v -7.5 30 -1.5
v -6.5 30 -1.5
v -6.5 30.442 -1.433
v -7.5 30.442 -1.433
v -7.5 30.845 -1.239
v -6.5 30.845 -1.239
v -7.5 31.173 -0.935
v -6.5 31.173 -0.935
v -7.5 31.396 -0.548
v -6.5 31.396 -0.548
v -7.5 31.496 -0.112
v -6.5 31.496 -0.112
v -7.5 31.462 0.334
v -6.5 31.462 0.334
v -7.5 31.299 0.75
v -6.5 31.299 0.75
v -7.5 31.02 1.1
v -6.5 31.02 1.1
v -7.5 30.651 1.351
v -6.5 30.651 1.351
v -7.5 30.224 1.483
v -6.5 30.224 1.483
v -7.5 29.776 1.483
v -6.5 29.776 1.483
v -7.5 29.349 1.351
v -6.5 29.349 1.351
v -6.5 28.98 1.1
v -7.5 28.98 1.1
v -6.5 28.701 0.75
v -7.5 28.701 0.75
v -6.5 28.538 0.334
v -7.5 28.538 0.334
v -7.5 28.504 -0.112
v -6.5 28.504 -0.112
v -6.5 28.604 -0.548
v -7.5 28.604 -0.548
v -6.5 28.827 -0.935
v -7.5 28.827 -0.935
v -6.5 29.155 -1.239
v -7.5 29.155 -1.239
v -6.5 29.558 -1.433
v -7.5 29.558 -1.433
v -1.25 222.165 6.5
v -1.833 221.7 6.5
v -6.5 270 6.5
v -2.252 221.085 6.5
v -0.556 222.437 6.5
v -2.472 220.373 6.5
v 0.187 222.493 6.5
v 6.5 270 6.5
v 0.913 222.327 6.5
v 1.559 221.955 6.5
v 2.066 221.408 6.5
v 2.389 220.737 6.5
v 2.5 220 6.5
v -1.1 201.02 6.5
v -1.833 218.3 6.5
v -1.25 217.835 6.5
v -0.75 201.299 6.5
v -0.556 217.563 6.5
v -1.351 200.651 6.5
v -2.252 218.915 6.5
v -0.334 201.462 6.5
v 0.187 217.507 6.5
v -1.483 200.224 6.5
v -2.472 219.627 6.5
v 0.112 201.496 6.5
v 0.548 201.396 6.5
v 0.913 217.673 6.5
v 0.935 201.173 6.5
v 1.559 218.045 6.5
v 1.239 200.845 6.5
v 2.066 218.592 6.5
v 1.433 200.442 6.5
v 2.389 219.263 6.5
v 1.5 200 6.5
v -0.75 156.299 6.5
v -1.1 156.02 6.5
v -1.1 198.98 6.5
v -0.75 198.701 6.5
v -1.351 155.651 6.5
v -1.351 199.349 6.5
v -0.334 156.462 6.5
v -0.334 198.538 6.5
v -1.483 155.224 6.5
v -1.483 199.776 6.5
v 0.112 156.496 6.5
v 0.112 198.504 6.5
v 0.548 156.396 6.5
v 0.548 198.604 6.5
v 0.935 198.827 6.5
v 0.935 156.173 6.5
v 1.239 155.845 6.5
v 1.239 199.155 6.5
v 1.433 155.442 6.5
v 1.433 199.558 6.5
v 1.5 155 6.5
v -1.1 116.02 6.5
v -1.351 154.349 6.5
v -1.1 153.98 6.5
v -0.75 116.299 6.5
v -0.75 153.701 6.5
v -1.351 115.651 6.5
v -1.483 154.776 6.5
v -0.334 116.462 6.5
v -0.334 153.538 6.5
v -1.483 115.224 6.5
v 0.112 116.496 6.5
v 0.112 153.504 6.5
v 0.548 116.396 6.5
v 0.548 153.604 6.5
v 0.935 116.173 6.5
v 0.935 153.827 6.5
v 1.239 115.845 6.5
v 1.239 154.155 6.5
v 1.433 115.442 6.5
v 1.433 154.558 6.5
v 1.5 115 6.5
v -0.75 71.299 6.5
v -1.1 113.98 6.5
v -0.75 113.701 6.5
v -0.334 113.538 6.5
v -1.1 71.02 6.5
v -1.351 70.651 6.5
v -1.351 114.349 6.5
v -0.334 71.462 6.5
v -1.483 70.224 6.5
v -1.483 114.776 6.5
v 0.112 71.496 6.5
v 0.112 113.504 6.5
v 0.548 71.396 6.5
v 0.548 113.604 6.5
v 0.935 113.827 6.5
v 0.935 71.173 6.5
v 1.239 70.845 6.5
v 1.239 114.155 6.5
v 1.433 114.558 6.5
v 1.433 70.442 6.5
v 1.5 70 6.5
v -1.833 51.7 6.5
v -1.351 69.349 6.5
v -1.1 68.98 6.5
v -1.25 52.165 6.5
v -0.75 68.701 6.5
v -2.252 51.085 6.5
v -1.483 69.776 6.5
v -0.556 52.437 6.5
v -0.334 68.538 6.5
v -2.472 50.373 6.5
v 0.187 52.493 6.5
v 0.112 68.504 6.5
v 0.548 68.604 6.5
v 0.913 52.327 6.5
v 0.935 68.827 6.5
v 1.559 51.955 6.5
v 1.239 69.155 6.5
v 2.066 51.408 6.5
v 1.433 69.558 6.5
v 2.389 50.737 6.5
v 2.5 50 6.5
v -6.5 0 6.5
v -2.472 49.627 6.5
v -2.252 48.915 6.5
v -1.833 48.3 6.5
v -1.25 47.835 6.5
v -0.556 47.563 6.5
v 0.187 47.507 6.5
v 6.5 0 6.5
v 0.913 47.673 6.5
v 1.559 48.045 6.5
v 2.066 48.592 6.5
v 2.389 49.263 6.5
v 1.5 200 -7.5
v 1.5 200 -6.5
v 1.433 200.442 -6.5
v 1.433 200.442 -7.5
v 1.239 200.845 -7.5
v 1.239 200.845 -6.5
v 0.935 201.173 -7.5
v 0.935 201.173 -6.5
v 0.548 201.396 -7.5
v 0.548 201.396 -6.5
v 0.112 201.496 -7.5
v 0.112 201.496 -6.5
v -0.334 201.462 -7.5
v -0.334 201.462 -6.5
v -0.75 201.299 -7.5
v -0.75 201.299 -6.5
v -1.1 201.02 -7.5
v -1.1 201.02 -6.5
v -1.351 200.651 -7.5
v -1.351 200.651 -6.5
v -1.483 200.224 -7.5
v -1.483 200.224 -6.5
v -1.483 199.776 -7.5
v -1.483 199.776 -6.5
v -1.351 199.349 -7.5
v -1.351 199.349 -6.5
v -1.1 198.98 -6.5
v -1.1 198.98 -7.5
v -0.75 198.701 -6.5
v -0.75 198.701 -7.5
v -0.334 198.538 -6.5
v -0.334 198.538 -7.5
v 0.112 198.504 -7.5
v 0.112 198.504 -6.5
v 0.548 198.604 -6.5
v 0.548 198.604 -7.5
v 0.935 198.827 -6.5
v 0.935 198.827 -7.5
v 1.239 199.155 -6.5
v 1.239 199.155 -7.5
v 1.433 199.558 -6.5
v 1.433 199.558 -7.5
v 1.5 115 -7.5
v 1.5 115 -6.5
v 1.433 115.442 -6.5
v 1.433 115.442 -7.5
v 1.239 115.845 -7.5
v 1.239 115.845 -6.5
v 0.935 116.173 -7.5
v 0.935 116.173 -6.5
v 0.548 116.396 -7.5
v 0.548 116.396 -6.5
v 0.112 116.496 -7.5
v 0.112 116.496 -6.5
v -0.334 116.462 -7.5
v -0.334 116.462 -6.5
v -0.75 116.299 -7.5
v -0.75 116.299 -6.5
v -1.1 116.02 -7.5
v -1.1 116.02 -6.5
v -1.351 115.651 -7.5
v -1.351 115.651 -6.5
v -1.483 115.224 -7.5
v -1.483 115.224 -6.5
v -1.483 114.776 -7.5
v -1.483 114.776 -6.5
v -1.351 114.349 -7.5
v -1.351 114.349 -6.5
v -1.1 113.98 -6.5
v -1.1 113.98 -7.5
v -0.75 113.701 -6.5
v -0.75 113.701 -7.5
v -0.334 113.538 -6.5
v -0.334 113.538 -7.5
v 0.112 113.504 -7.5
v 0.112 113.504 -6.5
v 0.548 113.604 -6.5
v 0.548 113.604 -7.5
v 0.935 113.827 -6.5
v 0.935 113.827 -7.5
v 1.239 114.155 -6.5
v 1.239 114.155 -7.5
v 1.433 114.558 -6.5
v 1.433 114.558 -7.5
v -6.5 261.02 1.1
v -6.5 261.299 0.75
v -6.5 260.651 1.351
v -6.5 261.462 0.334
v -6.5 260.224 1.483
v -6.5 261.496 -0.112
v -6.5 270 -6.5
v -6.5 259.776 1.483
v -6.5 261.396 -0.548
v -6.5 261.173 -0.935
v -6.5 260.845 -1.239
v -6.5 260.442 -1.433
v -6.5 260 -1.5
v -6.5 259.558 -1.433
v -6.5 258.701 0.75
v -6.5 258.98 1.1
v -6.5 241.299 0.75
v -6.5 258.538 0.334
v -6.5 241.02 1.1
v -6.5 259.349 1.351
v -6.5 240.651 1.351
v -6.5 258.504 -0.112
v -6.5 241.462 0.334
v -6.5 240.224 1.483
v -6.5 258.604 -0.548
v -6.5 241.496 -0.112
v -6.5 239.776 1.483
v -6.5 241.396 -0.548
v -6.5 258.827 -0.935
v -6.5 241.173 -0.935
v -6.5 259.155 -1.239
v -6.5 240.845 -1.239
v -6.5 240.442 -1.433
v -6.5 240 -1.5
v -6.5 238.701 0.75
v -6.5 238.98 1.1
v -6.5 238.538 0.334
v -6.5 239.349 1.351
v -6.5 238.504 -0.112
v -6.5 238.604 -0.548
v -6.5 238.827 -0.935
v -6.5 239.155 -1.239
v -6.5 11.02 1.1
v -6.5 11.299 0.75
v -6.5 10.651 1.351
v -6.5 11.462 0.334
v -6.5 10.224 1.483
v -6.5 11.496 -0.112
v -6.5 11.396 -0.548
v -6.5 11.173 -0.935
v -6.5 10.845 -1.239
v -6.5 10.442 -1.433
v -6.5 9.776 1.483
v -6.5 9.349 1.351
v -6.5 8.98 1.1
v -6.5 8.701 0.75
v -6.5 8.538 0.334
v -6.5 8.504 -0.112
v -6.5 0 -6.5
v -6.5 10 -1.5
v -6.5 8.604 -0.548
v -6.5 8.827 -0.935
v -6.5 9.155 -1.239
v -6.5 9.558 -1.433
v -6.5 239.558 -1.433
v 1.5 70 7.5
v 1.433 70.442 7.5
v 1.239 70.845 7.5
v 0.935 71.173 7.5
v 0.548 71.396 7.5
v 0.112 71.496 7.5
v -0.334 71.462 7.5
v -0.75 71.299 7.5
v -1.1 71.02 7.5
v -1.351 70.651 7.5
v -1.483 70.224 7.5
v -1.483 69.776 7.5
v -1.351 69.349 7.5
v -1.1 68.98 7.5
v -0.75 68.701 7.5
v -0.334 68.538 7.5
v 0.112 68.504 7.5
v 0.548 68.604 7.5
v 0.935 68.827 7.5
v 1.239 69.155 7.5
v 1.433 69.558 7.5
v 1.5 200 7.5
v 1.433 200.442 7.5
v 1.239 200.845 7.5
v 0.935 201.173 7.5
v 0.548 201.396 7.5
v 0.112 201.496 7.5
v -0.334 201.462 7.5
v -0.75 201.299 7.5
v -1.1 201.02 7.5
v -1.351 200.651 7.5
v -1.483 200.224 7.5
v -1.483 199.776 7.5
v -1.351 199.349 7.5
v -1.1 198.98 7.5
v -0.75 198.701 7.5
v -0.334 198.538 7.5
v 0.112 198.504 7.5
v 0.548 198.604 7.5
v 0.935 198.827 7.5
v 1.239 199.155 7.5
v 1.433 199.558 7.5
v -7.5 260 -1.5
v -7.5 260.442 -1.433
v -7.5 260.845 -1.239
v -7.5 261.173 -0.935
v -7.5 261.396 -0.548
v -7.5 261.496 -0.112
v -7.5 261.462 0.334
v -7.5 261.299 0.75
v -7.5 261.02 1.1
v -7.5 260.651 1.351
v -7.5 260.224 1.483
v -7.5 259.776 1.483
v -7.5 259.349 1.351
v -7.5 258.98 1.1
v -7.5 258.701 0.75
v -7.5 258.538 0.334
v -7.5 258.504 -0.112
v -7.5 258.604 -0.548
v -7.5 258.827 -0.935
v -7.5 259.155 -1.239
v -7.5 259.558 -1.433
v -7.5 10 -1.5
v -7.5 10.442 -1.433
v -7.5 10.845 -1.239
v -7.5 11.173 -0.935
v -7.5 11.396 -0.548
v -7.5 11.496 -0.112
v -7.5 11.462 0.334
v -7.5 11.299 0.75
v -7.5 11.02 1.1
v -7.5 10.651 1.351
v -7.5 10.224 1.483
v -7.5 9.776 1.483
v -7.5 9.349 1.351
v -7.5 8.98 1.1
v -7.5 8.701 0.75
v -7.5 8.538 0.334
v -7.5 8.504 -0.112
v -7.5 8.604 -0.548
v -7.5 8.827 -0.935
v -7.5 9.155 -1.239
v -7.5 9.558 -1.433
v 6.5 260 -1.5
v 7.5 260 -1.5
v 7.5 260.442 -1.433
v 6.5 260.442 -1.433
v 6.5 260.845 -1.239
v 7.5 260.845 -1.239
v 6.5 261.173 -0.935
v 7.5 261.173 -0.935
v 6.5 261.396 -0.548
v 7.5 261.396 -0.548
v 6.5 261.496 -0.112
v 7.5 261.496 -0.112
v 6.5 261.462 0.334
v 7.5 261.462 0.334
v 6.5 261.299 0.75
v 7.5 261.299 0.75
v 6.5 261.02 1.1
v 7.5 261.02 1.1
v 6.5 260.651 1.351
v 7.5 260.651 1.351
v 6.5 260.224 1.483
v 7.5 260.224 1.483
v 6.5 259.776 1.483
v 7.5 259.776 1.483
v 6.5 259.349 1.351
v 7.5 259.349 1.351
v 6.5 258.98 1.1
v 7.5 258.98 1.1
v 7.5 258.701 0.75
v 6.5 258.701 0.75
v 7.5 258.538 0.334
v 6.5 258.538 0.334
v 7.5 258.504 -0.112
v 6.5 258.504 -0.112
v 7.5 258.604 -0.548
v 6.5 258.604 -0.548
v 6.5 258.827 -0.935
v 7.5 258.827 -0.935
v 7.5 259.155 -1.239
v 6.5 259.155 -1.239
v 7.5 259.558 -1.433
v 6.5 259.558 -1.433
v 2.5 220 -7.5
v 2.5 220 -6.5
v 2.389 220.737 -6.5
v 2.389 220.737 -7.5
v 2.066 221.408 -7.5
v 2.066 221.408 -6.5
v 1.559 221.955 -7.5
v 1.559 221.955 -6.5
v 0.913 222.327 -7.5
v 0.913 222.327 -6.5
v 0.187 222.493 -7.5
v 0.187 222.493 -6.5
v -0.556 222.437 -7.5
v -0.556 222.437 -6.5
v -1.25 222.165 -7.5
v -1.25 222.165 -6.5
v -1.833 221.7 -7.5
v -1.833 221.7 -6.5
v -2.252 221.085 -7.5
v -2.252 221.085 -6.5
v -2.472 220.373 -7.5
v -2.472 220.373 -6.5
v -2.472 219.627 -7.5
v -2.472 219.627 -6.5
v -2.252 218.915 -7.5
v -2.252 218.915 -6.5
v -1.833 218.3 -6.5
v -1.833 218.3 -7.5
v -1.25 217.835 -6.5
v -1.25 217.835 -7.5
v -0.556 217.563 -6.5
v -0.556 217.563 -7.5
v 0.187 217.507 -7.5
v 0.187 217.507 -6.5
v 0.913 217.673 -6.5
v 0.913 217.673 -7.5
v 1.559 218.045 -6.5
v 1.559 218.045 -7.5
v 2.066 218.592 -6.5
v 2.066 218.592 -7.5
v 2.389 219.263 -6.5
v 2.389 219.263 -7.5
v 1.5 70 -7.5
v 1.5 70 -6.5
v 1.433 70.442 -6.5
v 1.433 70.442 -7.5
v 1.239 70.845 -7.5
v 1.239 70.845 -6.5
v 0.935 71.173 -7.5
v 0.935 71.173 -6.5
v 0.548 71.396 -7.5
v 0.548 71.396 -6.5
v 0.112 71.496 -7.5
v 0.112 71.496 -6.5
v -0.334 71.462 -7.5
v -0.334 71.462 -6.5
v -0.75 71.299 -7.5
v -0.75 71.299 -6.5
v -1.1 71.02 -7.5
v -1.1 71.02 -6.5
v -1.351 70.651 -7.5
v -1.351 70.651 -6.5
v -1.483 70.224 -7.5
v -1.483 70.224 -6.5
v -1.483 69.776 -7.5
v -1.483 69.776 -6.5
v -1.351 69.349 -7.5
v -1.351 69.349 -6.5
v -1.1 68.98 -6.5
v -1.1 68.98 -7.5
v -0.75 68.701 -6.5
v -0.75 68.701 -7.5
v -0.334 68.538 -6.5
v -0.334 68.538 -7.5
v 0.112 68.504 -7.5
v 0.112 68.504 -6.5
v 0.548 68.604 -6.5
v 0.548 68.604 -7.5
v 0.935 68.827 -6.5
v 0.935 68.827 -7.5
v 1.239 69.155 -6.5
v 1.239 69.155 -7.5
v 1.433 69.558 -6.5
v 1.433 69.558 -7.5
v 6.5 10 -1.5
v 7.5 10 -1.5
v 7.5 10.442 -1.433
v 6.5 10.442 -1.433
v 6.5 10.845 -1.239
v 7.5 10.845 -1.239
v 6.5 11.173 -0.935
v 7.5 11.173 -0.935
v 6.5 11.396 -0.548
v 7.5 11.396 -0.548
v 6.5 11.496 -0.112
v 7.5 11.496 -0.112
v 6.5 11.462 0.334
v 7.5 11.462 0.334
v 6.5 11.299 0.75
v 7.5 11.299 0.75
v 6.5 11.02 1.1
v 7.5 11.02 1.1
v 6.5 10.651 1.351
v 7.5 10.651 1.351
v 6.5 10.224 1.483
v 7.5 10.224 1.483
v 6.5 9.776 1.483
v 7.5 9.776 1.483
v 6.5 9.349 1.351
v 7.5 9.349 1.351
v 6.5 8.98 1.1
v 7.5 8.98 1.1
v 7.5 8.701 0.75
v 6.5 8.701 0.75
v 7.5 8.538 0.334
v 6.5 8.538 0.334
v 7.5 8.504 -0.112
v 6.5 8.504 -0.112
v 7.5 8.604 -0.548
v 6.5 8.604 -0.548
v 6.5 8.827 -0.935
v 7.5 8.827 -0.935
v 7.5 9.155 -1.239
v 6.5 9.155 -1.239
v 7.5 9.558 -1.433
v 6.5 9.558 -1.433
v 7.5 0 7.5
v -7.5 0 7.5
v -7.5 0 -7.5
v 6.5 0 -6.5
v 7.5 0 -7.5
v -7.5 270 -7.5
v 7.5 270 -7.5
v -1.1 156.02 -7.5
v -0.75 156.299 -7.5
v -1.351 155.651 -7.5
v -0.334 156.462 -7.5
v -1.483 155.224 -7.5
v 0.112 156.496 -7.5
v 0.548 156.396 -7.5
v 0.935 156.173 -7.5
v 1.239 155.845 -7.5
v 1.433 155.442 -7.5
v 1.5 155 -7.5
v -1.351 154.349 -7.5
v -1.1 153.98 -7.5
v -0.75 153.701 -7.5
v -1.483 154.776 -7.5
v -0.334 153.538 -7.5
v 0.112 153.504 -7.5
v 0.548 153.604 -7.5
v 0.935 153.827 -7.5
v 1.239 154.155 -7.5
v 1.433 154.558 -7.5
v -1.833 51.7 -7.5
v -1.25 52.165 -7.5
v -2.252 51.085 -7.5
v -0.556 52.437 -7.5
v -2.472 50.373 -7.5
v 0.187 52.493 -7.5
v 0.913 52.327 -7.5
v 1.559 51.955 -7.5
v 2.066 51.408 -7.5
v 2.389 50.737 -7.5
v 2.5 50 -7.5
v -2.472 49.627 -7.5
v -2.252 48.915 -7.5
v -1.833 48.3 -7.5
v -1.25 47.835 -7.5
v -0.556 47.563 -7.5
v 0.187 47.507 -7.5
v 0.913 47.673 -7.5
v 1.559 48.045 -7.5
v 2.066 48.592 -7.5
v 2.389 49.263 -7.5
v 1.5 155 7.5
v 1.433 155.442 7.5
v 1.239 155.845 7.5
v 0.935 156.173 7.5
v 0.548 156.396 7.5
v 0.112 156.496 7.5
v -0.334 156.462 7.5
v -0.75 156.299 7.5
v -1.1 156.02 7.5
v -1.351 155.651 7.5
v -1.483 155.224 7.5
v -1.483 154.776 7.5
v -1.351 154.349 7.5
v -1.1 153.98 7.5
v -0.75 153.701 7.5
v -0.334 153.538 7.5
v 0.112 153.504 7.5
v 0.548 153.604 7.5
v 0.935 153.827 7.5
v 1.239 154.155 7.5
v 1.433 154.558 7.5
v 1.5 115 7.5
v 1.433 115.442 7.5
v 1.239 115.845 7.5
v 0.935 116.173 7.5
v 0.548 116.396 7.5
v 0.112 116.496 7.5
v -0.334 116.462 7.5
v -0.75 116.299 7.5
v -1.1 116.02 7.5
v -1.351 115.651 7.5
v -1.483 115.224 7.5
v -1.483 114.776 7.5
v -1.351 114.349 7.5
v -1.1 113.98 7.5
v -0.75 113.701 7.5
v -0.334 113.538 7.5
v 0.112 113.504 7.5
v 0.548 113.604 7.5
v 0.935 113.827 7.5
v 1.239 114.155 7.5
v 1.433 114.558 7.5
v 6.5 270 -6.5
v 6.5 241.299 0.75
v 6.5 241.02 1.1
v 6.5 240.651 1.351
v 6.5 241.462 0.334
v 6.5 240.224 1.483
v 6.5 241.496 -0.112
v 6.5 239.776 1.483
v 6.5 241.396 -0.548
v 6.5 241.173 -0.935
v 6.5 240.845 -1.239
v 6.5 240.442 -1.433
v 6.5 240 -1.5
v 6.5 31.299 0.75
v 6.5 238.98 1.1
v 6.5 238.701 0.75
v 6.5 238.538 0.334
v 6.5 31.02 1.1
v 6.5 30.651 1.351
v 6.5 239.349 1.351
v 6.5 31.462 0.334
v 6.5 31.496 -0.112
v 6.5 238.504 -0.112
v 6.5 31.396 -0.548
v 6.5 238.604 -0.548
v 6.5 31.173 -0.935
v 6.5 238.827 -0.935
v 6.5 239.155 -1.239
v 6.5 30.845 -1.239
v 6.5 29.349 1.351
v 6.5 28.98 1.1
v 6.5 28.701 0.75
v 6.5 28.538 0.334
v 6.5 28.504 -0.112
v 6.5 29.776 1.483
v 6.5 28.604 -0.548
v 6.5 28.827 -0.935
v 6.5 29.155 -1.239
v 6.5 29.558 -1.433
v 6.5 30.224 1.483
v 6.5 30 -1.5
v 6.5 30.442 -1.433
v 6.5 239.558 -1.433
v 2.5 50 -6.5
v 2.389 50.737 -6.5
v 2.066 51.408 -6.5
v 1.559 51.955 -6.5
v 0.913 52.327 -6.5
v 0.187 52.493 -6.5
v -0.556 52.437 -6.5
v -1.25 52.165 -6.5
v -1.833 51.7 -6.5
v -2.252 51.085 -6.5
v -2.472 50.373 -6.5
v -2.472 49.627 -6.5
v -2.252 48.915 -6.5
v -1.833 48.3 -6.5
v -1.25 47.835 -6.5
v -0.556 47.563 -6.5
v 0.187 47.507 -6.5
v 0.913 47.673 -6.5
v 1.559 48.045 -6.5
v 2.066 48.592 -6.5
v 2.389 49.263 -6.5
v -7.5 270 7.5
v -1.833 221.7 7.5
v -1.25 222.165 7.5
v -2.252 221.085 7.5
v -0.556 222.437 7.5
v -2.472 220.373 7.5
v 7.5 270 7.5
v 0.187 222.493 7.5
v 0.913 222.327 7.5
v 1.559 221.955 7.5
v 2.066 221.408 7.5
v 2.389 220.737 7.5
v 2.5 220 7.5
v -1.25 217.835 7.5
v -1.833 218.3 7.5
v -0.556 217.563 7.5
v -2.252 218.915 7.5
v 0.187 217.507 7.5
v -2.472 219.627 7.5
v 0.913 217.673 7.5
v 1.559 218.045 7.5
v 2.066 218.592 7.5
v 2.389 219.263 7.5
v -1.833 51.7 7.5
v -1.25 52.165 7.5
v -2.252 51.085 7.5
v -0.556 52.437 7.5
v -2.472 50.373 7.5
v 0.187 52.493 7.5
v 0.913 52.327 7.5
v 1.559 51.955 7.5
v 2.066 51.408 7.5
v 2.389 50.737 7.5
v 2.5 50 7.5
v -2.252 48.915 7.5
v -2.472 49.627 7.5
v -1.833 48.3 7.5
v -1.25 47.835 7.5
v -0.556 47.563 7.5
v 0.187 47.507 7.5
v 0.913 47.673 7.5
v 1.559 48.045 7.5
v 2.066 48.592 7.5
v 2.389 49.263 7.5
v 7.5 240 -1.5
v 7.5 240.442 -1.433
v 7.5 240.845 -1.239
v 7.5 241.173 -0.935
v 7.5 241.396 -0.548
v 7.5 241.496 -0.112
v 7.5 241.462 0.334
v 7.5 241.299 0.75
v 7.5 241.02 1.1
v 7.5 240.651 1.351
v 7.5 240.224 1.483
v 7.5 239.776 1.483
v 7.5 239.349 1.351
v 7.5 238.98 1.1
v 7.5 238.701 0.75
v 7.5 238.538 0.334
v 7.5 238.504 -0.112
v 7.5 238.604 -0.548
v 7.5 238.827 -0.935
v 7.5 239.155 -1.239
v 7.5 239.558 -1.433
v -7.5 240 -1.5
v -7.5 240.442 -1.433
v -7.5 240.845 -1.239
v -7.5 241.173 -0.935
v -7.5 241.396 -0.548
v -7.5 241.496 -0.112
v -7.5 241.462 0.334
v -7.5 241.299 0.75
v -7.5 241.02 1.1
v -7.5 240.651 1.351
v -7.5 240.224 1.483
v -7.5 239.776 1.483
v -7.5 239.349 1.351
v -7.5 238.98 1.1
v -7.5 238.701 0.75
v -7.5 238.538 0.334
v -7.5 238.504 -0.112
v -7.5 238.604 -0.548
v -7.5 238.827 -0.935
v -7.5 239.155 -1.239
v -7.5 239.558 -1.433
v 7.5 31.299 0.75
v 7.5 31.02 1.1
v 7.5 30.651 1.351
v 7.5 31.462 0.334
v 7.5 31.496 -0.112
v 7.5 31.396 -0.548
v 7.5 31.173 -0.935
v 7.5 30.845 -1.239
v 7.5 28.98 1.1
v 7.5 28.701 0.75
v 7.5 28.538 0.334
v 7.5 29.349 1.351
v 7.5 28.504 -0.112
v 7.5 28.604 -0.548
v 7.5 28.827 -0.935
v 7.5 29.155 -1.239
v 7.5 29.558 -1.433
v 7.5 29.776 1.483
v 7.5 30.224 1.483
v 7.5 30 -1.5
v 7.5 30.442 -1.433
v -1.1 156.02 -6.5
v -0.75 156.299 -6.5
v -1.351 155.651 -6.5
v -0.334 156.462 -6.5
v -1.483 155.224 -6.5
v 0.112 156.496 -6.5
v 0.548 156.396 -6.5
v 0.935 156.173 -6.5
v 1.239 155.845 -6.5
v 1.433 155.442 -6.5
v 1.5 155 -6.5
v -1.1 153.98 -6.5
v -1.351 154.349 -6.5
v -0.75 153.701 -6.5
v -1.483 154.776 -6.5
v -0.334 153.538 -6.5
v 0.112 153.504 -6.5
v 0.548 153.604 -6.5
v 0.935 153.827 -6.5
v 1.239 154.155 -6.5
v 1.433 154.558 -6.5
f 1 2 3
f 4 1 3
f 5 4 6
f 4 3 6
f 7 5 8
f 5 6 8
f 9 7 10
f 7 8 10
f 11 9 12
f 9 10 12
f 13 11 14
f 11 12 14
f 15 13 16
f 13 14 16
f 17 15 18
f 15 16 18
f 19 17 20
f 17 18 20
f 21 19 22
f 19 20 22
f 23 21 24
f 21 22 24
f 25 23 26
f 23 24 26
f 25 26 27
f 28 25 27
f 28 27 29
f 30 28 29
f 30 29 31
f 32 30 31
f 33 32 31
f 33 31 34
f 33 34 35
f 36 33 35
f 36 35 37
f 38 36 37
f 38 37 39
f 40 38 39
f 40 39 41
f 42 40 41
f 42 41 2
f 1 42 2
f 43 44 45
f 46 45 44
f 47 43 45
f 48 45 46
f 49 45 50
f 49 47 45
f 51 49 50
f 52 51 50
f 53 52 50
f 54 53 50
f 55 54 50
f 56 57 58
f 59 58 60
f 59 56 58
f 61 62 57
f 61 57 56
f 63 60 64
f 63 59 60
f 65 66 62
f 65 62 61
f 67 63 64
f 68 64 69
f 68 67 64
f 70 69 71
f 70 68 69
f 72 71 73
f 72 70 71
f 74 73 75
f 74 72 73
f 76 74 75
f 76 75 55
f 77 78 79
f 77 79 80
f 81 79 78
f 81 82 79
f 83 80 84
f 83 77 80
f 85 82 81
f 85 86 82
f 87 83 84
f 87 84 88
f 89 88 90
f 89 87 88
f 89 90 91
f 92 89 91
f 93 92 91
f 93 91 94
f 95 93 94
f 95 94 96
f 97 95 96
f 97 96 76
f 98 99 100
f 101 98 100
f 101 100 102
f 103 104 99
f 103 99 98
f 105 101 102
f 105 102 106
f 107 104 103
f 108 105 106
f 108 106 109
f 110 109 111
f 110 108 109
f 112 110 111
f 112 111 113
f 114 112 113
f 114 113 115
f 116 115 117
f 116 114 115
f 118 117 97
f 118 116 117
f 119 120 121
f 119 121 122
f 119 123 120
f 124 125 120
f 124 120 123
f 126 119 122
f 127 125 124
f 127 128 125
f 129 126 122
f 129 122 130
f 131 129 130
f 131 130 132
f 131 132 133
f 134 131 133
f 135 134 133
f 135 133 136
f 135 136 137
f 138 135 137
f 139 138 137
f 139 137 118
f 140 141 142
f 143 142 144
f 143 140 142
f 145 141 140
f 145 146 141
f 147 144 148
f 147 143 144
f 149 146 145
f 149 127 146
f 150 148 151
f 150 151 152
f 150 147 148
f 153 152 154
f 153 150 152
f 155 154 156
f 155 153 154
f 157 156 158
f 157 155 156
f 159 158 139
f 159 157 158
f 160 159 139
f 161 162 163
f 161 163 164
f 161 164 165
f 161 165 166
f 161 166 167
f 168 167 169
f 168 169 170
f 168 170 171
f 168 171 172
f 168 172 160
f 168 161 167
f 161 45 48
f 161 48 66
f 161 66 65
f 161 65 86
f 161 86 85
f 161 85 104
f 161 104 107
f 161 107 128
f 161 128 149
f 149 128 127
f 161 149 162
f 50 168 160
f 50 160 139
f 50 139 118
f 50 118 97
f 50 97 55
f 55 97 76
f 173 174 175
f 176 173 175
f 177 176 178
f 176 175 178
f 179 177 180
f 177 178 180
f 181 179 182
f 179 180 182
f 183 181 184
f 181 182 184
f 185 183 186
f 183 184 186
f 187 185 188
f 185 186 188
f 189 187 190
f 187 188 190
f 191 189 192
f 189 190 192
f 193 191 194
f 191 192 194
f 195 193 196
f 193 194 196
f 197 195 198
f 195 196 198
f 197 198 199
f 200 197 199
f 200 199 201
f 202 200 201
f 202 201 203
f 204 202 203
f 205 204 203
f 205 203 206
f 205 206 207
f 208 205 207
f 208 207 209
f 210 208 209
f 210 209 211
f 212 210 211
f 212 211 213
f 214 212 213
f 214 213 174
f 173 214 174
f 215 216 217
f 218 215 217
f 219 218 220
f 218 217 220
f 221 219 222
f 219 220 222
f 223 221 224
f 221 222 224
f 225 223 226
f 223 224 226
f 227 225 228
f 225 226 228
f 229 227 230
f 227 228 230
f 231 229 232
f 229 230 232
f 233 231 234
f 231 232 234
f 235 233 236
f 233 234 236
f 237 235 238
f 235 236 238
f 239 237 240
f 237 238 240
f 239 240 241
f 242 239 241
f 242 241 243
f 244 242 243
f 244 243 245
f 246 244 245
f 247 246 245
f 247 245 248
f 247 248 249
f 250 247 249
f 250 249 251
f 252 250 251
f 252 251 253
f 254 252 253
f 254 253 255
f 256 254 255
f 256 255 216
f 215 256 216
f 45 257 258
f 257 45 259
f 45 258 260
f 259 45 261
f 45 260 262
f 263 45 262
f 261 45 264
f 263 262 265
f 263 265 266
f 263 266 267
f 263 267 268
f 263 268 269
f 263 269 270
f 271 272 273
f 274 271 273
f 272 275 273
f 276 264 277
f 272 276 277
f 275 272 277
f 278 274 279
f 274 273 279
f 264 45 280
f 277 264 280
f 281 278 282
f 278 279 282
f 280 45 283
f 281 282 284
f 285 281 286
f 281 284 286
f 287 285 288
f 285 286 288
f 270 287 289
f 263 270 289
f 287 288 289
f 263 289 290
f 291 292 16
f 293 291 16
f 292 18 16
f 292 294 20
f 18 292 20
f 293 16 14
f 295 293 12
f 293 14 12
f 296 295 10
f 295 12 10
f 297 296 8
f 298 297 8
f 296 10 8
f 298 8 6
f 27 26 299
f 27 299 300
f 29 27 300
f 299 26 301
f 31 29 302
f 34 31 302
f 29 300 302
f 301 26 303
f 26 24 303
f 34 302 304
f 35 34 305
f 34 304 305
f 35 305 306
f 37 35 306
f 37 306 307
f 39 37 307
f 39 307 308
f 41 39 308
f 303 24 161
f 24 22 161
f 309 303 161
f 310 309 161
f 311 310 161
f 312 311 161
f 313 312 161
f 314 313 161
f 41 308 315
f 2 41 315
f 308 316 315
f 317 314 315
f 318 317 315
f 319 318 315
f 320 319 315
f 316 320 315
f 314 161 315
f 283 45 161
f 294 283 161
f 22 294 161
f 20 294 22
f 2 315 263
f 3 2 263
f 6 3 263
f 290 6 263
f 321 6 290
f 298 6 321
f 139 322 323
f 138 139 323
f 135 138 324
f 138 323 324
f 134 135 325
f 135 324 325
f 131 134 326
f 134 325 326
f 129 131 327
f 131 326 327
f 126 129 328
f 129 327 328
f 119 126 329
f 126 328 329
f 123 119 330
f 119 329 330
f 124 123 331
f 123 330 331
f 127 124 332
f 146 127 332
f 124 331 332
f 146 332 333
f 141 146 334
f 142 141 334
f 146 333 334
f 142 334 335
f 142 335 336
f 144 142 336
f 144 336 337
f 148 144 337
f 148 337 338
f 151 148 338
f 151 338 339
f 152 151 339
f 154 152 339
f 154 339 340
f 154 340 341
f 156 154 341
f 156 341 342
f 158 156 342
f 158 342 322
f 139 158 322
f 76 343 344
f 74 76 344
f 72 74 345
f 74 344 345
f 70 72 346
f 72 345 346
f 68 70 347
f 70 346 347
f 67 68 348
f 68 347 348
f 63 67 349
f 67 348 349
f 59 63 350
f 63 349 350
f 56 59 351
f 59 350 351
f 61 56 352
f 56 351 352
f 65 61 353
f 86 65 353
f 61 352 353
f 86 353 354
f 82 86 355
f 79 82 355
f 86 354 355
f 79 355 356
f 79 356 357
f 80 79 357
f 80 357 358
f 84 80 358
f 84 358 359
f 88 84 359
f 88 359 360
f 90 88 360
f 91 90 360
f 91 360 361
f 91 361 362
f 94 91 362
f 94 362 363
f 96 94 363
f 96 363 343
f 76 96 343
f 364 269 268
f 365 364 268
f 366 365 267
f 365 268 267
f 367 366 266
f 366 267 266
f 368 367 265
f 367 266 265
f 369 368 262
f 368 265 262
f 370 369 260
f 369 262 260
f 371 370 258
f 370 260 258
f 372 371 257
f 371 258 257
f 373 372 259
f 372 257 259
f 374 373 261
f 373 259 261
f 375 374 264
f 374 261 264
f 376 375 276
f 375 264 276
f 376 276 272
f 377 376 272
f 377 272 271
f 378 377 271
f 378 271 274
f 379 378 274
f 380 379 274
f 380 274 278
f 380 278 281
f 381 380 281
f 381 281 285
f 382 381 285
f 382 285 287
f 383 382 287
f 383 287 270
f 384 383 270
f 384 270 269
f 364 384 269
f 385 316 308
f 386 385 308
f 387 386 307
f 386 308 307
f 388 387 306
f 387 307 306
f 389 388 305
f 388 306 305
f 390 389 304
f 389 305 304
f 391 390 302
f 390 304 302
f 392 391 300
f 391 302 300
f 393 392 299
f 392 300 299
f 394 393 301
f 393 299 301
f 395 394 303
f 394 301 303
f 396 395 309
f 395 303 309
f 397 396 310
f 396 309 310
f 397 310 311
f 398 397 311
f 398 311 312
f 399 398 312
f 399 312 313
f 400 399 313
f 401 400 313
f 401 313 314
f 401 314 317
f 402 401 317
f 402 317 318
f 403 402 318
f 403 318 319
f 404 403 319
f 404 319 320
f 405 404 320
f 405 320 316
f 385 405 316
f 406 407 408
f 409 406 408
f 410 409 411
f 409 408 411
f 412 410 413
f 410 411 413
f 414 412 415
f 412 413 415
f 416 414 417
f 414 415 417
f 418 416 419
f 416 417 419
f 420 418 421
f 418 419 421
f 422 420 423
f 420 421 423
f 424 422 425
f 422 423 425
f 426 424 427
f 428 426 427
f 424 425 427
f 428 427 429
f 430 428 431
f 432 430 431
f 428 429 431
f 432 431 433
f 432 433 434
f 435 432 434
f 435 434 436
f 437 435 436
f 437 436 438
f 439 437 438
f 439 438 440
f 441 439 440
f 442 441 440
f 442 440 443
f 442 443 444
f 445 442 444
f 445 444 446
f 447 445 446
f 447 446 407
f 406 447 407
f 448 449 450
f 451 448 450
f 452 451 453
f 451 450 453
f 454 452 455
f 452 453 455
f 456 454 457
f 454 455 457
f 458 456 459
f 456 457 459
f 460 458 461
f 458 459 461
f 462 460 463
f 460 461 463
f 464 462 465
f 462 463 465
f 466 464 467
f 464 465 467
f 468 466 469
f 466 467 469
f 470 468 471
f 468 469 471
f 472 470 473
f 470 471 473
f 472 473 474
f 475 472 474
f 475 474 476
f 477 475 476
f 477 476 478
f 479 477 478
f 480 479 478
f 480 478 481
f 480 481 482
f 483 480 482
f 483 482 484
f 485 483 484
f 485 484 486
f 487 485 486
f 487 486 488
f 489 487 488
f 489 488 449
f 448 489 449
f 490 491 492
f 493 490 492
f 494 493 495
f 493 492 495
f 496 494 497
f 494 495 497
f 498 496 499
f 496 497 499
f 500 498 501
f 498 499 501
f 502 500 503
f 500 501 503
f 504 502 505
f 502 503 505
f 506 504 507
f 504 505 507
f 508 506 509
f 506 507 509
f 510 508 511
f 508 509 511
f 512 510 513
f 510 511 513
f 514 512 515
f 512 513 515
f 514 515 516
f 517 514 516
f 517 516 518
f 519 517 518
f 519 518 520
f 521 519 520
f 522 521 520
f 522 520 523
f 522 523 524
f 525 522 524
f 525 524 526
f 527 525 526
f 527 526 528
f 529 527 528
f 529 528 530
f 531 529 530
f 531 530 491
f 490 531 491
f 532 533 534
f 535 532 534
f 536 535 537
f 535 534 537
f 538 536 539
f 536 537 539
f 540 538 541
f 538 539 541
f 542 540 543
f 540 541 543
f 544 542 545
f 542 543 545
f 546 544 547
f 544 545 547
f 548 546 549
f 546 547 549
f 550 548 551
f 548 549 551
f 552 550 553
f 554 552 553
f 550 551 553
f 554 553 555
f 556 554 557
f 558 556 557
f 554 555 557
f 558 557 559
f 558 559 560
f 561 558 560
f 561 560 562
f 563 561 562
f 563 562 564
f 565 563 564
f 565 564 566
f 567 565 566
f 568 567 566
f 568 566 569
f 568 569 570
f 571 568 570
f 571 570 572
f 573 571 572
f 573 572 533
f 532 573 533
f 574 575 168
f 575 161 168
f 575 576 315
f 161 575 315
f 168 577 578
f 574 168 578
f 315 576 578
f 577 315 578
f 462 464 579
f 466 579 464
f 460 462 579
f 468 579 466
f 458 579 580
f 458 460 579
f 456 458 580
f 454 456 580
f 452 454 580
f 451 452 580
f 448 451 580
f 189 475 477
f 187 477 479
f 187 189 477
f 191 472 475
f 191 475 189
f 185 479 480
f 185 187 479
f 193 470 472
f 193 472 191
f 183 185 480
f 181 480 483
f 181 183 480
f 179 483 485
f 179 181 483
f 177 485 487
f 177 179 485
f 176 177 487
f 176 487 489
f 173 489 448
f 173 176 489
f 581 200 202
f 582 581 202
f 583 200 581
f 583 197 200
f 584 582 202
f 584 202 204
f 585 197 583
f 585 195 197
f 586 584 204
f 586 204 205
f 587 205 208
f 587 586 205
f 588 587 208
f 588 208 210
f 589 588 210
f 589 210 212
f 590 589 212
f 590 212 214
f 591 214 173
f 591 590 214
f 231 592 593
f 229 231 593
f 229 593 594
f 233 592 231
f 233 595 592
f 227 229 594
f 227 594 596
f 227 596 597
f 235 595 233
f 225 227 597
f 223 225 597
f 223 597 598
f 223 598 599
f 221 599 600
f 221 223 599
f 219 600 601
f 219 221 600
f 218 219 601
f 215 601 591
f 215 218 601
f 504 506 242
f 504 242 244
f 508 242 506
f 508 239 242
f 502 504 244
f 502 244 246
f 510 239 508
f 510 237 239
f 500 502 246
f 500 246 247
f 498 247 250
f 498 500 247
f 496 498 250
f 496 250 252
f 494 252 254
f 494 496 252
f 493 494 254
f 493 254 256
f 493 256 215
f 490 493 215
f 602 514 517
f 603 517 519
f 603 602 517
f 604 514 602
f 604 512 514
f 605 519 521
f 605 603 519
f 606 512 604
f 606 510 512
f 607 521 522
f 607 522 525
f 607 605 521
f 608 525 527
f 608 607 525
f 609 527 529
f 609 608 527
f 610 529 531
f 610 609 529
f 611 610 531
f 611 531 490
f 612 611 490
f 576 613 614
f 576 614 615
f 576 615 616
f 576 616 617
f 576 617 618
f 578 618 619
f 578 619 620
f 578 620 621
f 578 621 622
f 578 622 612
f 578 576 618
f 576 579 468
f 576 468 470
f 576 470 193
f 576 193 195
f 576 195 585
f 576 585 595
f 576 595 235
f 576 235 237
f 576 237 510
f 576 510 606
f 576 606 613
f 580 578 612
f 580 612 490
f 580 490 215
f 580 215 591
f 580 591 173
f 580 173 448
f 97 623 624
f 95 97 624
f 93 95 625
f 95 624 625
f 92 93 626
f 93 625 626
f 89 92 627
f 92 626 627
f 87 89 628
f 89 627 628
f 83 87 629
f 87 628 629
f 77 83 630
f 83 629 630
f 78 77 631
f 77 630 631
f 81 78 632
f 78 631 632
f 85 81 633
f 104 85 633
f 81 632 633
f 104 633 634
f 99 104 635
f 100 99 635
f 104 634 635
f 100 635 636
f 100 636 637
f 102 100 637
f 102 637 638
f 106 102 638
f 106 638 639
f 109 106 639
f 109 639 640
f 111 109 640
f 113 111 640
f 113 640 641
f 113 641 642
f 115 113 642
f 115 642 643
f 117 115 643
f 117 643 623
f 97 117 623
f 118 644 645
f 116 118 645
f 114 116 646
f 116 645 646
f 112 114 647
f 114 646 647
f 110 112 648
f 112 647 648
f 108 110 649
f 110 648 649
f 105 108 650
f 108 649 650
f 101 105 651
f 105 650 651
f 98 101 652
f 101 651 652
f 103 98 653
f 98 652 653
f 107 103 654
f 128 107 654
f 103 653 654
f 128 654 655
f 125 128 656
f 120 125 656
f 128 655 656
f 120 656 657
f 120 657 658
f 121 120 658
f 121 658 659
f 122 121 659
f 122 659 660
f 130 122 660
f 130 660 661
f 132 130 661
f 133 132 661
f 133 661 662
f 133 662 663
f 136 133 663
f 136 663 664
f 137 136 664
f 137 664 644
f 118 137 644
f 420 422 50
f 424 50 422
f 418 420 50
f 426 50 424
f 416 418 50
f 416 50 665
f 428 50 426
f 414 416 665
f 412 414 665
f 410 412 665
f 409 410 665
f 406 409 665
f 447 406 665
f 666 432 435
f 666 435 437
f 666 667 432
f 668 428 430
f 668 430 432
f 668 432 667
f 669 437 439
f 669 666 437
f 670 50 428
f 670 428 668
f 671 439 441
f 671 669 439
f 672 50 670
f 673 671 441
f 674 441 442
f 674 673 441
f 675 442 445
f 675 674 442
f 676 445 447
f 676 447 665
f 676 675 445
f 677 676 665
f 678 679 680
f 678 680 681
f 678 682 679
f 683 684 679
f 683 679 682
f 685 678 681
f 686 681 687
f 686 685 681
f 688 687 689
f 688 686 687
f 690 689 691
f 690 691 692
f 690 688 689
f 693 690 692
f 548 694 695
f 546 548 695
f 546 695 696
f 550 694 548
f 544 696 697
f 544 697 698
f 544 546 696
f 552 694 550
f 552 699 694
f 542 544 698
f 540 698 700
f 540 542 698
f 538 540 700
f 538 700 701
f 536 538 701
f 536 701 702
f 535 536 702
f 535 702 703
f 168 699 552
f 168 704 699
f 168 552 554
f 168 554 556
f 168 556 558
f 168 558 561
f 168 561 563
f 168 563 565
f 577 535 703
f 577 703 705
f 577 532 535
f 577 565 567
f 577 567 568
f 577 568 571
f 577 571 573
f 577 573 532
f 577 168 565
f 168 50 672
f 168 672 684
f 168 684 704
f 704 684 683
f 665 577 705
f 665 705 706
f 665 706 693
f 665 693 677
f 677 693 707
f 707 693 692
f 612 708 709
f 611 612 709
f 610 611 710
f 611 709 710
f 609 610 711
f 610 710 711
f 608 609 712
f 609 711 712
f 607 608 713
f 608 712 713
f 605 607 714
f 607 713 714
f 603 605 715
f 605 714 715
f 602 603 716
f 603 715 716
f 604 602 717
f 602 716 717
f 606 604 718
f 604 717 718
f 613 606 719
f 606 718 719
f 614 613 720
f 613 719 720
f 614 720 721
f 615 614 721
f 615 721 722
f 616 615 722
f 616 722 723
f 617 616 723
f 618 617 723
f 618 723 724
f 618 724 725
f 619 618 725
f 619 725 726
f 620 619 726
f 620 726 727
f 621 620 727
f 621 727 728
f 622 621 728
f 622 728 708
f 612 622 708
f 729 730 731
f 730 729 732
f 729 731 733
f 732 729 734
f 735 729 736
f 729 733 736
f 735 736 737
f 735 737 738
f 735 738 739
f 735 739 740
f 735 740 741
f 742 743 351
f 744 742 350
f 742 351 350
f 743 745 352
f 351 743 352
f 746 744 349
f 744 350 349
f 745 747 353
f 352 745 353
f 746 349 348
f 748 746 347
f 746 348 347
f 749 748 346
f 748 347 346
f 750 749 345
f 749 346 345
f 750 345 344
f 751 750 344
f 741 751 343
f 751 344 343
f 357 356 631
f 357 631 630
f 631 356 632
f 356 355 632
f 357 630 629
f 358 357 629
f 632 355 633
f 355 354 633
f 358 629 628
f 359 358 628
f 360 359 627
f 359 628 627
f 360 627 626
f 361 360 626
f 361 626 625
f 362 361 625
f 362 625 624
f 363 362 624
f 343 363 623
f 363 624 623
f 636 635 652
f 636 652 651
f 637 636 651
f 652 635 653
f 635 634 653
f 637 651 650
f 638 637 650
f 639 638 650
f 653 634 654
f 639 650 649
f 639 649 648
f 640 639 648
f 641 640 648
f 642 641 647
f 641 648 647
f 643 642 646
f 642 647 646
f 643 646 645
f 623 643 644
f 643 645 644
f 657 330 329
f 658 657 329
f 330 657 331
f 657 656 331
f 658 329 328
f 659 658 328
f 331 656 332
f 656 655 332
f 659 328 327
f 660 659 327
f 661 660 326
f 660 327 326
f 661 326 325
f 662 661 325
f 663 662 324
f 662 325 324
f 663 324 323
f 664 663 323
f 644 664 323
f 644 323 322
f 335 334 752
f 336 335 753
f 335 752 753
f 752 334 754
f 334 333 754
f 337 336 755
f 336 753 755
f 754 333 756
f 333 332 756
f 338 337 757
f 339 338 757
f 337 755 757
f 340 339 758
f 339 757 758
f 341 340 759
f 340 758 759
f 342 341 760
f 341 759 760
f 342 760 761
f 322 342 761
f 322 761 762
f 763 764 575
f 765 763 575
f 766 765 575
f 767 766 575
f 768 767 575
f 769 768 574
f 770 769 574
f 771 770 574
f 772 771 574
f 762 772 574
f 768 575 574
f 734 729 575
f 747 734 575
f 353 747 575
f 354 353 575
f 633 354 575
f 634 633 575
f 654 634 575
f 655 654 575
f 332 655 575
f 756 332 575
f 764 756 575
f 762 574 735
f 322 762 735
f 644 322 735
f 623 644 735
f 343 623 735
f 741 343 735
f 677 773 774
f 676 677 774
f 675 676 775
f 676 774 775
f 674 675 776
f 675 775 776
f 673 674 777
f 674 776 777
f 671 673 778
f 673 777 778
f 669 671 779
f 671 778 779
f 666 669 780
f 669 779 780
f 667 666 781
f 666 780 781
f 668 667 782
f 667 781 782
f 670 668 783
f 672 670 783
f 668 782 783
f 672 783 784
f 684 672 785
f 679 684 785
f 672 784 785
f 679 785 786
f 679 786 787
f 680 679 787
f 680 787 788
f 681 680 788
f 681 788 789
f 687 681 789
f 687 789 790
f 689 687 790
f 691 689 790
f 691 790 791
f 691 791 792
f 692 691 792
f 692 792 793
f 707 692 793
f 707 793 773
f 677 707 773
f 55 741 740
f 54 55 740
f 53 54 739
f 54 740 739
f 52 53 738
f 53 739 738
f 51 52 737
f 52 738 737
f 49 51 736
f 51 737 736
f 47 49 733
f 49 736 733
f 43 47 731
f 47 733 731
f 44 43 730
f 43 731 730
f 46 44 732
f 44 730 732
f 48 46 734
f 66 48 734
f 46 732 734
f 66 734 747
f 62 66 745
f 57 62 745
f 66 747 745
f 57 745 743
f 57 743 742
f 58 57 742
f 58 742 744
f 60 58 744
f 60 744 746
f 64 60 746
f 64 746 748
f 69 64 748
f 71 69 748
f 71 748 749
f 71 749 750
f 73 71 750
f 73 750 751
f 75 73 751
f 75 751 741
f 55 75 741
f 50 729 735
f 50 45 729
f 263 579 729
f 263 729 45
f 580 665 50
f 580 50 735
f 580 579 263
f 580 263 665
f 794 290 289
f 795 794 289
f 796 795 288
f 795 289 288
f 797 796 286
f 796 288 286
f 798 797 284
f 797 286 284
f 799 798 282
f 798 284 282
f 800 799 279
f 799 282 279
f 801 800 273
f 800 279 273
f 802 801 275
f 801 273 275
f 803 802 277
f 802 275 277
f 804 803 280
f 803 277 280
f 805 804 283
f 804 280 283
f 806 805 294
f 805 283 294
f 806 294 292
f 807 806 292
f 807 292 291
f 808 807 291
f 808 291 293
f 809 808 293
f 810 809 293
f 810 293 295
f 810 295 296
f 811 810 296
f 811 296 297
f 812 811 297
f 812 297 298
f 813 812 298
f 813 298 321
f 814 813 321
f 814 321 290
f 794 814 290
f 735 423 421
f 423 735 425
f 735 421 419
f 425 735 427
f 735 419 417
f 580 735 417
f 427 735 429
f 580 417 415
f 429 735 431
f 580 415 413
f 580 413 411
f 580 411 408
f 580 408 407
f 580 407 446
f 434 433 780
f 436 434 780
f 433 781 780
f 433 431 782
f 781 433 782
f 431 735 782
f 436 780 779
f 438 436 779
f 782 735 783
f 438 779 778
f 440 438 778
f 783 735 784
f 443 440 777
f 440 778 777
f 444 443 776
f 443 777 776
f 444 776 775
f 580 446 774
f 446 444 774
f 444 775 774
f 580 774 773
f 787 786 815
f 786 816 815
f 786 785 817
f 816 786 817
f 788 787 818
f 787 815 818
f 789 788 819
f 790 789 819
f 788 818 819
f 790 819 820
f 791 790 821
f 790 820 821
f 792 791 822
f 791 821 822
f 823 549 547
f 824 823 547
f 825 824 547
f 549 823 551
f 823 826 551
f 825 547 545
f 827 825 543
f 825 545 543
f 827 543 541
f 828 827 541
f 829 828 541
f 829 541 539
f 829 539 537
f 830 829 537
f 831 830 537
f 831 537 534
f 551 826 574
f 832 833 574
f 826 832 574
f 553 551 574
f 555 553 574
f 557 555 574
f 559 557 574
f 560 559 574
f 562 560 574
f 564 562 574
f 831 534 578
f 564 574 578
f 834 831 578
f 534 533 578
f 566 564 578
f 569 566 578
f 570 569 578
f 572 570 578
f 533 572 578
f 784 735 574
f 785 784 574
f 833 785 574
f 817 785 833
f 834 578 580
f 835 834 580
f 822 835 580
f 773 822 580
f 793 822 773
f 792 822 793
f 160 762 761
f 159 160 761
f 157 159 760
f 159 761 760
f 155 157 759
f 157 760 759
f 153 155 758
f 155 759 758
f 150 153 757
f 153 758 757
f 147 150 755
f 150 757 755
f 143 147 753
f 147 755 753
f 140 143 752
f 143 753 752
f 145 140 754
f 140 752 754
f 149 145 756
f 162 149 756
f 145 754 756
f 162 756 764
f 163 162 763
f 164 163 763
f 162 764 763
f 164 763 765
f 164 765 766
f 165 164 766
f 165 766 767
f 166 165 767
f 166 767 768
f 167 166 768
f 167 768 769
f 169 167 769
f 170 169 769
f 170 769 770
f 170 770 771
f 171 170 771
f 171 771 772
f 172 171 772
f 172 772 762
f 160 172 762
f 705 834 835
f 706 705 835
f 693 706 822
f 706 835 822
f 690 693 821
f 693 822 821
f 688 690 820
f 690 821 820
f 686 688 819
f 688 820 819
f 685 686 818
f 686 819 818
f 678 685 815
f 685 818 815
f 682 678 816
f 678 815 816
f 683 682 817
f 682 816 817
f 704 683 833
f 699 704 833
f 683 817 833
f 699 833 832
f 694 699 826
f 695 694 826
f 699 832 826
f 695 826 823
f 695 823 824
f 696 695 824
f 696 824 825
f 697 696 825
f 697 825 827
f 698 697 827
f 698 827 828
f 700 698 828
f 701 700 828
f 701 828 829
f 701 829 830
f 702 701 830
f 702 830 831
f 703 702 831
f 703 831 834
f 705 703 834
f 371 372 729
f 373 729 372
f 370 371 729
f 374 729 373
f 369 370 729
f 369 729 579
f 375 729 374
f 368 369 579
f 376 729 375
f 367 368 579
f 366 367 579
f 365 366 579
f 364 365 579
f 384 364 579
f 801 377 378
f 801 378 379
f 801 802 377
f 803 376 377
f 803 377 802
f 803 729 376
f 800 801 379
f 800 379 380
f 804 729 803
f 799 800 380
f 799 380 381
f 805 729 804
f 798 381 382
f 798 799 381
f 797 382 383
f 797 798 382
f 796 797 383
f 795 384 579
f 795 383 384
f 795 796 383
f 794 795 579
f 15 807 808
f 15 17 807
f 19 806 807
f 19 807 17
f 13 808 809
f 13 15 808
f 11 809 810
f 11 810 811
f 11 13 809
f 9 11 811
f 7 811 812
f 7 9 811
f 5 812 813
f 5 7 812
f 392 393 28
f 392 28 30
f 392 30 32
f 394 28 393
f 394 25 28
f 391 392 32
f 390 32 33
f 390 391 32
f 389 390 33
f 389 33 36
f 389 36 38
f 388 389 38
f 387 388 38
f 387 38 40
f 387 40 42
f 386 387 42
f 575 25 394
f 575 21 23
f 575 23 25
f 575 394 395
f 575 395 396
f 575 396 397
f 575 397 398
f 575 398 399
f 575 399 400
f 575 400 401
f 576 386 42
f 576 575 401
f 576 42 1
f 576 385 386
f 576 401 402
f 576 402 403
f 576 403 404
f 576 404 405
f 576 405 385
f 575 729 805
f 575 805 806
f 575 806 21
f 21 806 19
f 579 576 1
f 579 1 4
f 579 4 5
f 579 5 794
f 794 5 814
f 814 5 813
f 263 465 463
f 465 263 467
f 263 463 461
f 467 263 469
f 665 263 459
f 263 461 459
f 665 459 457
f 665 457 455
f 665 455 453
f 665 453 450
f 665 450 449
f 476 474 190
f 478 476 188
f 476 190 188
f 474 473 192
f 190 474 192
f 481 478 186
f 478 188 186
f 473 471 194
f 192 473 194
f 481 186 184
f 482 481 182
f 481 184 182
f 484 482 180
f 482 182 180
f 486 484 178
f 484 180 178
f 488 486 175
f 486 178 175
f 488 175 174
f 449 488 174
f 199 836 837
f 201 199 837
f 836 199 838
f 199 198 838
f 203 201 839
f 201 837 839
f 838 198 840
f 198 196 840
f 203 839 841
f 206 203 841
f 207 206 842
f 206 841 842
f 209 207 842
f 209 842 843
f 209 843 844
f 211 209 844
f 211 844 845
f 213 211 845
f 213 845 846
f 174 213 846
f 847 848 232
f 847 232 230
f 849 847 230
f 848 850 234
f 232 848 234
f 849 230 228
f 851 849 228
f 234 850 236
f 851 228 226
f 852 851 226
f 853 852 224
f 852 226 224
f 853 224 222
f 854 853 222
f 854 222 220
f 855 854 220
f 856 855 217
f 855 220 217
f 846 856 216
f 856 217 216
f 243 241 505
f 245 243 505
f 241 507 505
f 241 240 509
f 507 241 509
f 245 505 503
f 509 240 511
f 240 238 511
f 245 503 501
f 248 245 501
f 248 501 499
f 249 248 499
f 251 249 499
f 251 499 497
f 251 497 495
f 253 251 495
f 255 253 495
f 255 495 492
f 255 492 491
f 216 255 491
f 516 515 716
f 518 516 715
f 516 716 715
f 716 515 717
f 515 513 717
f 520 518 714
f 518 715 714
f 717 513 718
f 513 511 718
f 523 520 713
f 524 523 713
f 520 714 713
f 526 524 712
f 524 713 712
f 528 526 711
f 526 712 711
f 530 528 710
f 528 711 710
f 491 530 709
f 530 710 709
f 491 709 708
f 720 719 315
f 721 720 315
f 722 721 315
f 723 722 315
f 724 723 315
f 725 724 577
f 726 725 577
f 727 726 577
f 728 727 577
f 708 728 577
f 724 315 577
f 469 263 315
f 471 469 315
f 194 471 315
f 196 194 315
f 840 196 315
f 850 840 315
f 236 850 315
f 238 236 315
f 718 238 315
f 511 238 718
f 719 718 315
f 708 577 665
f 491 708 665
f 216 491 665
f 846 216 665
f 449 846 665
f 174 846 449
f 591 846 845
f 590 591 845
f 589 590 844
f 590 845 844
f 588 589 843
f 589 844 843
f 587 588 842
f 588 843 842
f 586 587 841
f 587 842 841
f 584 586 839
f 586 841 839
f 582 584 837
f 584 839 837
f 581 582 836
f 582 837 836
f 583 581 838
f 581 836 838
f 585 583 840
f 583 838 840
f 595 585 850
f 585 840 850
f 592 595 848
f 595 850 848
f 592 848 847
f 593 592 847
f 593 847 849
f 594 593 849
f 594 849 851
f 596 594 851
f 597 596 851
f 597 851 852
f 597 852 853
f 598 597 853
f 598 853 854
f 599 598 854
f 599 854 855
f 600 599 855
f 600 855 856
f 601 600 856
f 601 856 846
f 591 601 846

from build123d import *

# Parameters (mm, degrees)
SKETCH_1_W          = 15
SKETCH_1_H          = 15
SKETCH_1_W_2        = 13
SKETCH_1_H_2        = 13
EXTRUDE_1_DEPTH     = 270
SKETCH_2_R          = 1.5
SKETCH_2_R_2        = 2.5
CUT_EXTRUDE_1_DEPTH = 271.520331953
SKETCH_3_R          = 1.5
CUT_EXTRUDE_2_DEPTH = 271.520331953


with BuildPart() as part:
    # 草图1 → 凸台-拉伸1 (new body)
    with BuildSketch(Plane(origin=(0, 0, 0), x_dir=(1, 0, 0), z_dir=(0, 1, 0))):
        Rectangle(SKETCH_1_W, SKETCH_1_H)
        Rectangle(SKETCH_1_W_2, SKETCH_1_H_2, mode=Mode.SUBTRACT)
    extrude(amount=EXTRUDE_1_DEPTH)

    # 草图2 → 切除-拉伸1 (cut, through all)
    with BuildSketch(Plane.XY.offset(7.5)):
        with Locations((0, 155)):
            Circle(SKETCH_2_R)
        with Locations((0, 115)):
            Circle(SKETCH_2_R)
        with Locations((0, 200)):
            Circle(SKETCH_2_R)
        with Locations((0, 70)):
            Circle(SKETCH_2_R)
        with Locations((0, 220)):
            Circle(SKETCH_2_R_2)
        with Locations((0, 50)):
            Circle(SKETCH_2_R_2)
    extrude(amount=-CUT_EXTRUDE_1_DEPTH, mode=Mode.SUBTRACT)

    # 草图3 → 切除-拉伸2 (cut, through all)
    with BuildSketch(Plane(origin=(7.5, 0, 0), x_dir=(0, 0, -1), z_dir=(1, 0, 0))):
        with Locations((0, 240)):
            Circle(SKETCH_3_R)
        with Locations((0, 30)):
            Circle(SKETCH_3_R)
        with Locations((0, 10)):
            Circle(SKETCH_3_R)
        with Locations((0, 260)):
            Circle(SKETCH_3_R)
    extrude(amount=-CUT_EXTRUDE_2_DEPTH, mode=Mode.SUBTRACT)


solid = part.part
